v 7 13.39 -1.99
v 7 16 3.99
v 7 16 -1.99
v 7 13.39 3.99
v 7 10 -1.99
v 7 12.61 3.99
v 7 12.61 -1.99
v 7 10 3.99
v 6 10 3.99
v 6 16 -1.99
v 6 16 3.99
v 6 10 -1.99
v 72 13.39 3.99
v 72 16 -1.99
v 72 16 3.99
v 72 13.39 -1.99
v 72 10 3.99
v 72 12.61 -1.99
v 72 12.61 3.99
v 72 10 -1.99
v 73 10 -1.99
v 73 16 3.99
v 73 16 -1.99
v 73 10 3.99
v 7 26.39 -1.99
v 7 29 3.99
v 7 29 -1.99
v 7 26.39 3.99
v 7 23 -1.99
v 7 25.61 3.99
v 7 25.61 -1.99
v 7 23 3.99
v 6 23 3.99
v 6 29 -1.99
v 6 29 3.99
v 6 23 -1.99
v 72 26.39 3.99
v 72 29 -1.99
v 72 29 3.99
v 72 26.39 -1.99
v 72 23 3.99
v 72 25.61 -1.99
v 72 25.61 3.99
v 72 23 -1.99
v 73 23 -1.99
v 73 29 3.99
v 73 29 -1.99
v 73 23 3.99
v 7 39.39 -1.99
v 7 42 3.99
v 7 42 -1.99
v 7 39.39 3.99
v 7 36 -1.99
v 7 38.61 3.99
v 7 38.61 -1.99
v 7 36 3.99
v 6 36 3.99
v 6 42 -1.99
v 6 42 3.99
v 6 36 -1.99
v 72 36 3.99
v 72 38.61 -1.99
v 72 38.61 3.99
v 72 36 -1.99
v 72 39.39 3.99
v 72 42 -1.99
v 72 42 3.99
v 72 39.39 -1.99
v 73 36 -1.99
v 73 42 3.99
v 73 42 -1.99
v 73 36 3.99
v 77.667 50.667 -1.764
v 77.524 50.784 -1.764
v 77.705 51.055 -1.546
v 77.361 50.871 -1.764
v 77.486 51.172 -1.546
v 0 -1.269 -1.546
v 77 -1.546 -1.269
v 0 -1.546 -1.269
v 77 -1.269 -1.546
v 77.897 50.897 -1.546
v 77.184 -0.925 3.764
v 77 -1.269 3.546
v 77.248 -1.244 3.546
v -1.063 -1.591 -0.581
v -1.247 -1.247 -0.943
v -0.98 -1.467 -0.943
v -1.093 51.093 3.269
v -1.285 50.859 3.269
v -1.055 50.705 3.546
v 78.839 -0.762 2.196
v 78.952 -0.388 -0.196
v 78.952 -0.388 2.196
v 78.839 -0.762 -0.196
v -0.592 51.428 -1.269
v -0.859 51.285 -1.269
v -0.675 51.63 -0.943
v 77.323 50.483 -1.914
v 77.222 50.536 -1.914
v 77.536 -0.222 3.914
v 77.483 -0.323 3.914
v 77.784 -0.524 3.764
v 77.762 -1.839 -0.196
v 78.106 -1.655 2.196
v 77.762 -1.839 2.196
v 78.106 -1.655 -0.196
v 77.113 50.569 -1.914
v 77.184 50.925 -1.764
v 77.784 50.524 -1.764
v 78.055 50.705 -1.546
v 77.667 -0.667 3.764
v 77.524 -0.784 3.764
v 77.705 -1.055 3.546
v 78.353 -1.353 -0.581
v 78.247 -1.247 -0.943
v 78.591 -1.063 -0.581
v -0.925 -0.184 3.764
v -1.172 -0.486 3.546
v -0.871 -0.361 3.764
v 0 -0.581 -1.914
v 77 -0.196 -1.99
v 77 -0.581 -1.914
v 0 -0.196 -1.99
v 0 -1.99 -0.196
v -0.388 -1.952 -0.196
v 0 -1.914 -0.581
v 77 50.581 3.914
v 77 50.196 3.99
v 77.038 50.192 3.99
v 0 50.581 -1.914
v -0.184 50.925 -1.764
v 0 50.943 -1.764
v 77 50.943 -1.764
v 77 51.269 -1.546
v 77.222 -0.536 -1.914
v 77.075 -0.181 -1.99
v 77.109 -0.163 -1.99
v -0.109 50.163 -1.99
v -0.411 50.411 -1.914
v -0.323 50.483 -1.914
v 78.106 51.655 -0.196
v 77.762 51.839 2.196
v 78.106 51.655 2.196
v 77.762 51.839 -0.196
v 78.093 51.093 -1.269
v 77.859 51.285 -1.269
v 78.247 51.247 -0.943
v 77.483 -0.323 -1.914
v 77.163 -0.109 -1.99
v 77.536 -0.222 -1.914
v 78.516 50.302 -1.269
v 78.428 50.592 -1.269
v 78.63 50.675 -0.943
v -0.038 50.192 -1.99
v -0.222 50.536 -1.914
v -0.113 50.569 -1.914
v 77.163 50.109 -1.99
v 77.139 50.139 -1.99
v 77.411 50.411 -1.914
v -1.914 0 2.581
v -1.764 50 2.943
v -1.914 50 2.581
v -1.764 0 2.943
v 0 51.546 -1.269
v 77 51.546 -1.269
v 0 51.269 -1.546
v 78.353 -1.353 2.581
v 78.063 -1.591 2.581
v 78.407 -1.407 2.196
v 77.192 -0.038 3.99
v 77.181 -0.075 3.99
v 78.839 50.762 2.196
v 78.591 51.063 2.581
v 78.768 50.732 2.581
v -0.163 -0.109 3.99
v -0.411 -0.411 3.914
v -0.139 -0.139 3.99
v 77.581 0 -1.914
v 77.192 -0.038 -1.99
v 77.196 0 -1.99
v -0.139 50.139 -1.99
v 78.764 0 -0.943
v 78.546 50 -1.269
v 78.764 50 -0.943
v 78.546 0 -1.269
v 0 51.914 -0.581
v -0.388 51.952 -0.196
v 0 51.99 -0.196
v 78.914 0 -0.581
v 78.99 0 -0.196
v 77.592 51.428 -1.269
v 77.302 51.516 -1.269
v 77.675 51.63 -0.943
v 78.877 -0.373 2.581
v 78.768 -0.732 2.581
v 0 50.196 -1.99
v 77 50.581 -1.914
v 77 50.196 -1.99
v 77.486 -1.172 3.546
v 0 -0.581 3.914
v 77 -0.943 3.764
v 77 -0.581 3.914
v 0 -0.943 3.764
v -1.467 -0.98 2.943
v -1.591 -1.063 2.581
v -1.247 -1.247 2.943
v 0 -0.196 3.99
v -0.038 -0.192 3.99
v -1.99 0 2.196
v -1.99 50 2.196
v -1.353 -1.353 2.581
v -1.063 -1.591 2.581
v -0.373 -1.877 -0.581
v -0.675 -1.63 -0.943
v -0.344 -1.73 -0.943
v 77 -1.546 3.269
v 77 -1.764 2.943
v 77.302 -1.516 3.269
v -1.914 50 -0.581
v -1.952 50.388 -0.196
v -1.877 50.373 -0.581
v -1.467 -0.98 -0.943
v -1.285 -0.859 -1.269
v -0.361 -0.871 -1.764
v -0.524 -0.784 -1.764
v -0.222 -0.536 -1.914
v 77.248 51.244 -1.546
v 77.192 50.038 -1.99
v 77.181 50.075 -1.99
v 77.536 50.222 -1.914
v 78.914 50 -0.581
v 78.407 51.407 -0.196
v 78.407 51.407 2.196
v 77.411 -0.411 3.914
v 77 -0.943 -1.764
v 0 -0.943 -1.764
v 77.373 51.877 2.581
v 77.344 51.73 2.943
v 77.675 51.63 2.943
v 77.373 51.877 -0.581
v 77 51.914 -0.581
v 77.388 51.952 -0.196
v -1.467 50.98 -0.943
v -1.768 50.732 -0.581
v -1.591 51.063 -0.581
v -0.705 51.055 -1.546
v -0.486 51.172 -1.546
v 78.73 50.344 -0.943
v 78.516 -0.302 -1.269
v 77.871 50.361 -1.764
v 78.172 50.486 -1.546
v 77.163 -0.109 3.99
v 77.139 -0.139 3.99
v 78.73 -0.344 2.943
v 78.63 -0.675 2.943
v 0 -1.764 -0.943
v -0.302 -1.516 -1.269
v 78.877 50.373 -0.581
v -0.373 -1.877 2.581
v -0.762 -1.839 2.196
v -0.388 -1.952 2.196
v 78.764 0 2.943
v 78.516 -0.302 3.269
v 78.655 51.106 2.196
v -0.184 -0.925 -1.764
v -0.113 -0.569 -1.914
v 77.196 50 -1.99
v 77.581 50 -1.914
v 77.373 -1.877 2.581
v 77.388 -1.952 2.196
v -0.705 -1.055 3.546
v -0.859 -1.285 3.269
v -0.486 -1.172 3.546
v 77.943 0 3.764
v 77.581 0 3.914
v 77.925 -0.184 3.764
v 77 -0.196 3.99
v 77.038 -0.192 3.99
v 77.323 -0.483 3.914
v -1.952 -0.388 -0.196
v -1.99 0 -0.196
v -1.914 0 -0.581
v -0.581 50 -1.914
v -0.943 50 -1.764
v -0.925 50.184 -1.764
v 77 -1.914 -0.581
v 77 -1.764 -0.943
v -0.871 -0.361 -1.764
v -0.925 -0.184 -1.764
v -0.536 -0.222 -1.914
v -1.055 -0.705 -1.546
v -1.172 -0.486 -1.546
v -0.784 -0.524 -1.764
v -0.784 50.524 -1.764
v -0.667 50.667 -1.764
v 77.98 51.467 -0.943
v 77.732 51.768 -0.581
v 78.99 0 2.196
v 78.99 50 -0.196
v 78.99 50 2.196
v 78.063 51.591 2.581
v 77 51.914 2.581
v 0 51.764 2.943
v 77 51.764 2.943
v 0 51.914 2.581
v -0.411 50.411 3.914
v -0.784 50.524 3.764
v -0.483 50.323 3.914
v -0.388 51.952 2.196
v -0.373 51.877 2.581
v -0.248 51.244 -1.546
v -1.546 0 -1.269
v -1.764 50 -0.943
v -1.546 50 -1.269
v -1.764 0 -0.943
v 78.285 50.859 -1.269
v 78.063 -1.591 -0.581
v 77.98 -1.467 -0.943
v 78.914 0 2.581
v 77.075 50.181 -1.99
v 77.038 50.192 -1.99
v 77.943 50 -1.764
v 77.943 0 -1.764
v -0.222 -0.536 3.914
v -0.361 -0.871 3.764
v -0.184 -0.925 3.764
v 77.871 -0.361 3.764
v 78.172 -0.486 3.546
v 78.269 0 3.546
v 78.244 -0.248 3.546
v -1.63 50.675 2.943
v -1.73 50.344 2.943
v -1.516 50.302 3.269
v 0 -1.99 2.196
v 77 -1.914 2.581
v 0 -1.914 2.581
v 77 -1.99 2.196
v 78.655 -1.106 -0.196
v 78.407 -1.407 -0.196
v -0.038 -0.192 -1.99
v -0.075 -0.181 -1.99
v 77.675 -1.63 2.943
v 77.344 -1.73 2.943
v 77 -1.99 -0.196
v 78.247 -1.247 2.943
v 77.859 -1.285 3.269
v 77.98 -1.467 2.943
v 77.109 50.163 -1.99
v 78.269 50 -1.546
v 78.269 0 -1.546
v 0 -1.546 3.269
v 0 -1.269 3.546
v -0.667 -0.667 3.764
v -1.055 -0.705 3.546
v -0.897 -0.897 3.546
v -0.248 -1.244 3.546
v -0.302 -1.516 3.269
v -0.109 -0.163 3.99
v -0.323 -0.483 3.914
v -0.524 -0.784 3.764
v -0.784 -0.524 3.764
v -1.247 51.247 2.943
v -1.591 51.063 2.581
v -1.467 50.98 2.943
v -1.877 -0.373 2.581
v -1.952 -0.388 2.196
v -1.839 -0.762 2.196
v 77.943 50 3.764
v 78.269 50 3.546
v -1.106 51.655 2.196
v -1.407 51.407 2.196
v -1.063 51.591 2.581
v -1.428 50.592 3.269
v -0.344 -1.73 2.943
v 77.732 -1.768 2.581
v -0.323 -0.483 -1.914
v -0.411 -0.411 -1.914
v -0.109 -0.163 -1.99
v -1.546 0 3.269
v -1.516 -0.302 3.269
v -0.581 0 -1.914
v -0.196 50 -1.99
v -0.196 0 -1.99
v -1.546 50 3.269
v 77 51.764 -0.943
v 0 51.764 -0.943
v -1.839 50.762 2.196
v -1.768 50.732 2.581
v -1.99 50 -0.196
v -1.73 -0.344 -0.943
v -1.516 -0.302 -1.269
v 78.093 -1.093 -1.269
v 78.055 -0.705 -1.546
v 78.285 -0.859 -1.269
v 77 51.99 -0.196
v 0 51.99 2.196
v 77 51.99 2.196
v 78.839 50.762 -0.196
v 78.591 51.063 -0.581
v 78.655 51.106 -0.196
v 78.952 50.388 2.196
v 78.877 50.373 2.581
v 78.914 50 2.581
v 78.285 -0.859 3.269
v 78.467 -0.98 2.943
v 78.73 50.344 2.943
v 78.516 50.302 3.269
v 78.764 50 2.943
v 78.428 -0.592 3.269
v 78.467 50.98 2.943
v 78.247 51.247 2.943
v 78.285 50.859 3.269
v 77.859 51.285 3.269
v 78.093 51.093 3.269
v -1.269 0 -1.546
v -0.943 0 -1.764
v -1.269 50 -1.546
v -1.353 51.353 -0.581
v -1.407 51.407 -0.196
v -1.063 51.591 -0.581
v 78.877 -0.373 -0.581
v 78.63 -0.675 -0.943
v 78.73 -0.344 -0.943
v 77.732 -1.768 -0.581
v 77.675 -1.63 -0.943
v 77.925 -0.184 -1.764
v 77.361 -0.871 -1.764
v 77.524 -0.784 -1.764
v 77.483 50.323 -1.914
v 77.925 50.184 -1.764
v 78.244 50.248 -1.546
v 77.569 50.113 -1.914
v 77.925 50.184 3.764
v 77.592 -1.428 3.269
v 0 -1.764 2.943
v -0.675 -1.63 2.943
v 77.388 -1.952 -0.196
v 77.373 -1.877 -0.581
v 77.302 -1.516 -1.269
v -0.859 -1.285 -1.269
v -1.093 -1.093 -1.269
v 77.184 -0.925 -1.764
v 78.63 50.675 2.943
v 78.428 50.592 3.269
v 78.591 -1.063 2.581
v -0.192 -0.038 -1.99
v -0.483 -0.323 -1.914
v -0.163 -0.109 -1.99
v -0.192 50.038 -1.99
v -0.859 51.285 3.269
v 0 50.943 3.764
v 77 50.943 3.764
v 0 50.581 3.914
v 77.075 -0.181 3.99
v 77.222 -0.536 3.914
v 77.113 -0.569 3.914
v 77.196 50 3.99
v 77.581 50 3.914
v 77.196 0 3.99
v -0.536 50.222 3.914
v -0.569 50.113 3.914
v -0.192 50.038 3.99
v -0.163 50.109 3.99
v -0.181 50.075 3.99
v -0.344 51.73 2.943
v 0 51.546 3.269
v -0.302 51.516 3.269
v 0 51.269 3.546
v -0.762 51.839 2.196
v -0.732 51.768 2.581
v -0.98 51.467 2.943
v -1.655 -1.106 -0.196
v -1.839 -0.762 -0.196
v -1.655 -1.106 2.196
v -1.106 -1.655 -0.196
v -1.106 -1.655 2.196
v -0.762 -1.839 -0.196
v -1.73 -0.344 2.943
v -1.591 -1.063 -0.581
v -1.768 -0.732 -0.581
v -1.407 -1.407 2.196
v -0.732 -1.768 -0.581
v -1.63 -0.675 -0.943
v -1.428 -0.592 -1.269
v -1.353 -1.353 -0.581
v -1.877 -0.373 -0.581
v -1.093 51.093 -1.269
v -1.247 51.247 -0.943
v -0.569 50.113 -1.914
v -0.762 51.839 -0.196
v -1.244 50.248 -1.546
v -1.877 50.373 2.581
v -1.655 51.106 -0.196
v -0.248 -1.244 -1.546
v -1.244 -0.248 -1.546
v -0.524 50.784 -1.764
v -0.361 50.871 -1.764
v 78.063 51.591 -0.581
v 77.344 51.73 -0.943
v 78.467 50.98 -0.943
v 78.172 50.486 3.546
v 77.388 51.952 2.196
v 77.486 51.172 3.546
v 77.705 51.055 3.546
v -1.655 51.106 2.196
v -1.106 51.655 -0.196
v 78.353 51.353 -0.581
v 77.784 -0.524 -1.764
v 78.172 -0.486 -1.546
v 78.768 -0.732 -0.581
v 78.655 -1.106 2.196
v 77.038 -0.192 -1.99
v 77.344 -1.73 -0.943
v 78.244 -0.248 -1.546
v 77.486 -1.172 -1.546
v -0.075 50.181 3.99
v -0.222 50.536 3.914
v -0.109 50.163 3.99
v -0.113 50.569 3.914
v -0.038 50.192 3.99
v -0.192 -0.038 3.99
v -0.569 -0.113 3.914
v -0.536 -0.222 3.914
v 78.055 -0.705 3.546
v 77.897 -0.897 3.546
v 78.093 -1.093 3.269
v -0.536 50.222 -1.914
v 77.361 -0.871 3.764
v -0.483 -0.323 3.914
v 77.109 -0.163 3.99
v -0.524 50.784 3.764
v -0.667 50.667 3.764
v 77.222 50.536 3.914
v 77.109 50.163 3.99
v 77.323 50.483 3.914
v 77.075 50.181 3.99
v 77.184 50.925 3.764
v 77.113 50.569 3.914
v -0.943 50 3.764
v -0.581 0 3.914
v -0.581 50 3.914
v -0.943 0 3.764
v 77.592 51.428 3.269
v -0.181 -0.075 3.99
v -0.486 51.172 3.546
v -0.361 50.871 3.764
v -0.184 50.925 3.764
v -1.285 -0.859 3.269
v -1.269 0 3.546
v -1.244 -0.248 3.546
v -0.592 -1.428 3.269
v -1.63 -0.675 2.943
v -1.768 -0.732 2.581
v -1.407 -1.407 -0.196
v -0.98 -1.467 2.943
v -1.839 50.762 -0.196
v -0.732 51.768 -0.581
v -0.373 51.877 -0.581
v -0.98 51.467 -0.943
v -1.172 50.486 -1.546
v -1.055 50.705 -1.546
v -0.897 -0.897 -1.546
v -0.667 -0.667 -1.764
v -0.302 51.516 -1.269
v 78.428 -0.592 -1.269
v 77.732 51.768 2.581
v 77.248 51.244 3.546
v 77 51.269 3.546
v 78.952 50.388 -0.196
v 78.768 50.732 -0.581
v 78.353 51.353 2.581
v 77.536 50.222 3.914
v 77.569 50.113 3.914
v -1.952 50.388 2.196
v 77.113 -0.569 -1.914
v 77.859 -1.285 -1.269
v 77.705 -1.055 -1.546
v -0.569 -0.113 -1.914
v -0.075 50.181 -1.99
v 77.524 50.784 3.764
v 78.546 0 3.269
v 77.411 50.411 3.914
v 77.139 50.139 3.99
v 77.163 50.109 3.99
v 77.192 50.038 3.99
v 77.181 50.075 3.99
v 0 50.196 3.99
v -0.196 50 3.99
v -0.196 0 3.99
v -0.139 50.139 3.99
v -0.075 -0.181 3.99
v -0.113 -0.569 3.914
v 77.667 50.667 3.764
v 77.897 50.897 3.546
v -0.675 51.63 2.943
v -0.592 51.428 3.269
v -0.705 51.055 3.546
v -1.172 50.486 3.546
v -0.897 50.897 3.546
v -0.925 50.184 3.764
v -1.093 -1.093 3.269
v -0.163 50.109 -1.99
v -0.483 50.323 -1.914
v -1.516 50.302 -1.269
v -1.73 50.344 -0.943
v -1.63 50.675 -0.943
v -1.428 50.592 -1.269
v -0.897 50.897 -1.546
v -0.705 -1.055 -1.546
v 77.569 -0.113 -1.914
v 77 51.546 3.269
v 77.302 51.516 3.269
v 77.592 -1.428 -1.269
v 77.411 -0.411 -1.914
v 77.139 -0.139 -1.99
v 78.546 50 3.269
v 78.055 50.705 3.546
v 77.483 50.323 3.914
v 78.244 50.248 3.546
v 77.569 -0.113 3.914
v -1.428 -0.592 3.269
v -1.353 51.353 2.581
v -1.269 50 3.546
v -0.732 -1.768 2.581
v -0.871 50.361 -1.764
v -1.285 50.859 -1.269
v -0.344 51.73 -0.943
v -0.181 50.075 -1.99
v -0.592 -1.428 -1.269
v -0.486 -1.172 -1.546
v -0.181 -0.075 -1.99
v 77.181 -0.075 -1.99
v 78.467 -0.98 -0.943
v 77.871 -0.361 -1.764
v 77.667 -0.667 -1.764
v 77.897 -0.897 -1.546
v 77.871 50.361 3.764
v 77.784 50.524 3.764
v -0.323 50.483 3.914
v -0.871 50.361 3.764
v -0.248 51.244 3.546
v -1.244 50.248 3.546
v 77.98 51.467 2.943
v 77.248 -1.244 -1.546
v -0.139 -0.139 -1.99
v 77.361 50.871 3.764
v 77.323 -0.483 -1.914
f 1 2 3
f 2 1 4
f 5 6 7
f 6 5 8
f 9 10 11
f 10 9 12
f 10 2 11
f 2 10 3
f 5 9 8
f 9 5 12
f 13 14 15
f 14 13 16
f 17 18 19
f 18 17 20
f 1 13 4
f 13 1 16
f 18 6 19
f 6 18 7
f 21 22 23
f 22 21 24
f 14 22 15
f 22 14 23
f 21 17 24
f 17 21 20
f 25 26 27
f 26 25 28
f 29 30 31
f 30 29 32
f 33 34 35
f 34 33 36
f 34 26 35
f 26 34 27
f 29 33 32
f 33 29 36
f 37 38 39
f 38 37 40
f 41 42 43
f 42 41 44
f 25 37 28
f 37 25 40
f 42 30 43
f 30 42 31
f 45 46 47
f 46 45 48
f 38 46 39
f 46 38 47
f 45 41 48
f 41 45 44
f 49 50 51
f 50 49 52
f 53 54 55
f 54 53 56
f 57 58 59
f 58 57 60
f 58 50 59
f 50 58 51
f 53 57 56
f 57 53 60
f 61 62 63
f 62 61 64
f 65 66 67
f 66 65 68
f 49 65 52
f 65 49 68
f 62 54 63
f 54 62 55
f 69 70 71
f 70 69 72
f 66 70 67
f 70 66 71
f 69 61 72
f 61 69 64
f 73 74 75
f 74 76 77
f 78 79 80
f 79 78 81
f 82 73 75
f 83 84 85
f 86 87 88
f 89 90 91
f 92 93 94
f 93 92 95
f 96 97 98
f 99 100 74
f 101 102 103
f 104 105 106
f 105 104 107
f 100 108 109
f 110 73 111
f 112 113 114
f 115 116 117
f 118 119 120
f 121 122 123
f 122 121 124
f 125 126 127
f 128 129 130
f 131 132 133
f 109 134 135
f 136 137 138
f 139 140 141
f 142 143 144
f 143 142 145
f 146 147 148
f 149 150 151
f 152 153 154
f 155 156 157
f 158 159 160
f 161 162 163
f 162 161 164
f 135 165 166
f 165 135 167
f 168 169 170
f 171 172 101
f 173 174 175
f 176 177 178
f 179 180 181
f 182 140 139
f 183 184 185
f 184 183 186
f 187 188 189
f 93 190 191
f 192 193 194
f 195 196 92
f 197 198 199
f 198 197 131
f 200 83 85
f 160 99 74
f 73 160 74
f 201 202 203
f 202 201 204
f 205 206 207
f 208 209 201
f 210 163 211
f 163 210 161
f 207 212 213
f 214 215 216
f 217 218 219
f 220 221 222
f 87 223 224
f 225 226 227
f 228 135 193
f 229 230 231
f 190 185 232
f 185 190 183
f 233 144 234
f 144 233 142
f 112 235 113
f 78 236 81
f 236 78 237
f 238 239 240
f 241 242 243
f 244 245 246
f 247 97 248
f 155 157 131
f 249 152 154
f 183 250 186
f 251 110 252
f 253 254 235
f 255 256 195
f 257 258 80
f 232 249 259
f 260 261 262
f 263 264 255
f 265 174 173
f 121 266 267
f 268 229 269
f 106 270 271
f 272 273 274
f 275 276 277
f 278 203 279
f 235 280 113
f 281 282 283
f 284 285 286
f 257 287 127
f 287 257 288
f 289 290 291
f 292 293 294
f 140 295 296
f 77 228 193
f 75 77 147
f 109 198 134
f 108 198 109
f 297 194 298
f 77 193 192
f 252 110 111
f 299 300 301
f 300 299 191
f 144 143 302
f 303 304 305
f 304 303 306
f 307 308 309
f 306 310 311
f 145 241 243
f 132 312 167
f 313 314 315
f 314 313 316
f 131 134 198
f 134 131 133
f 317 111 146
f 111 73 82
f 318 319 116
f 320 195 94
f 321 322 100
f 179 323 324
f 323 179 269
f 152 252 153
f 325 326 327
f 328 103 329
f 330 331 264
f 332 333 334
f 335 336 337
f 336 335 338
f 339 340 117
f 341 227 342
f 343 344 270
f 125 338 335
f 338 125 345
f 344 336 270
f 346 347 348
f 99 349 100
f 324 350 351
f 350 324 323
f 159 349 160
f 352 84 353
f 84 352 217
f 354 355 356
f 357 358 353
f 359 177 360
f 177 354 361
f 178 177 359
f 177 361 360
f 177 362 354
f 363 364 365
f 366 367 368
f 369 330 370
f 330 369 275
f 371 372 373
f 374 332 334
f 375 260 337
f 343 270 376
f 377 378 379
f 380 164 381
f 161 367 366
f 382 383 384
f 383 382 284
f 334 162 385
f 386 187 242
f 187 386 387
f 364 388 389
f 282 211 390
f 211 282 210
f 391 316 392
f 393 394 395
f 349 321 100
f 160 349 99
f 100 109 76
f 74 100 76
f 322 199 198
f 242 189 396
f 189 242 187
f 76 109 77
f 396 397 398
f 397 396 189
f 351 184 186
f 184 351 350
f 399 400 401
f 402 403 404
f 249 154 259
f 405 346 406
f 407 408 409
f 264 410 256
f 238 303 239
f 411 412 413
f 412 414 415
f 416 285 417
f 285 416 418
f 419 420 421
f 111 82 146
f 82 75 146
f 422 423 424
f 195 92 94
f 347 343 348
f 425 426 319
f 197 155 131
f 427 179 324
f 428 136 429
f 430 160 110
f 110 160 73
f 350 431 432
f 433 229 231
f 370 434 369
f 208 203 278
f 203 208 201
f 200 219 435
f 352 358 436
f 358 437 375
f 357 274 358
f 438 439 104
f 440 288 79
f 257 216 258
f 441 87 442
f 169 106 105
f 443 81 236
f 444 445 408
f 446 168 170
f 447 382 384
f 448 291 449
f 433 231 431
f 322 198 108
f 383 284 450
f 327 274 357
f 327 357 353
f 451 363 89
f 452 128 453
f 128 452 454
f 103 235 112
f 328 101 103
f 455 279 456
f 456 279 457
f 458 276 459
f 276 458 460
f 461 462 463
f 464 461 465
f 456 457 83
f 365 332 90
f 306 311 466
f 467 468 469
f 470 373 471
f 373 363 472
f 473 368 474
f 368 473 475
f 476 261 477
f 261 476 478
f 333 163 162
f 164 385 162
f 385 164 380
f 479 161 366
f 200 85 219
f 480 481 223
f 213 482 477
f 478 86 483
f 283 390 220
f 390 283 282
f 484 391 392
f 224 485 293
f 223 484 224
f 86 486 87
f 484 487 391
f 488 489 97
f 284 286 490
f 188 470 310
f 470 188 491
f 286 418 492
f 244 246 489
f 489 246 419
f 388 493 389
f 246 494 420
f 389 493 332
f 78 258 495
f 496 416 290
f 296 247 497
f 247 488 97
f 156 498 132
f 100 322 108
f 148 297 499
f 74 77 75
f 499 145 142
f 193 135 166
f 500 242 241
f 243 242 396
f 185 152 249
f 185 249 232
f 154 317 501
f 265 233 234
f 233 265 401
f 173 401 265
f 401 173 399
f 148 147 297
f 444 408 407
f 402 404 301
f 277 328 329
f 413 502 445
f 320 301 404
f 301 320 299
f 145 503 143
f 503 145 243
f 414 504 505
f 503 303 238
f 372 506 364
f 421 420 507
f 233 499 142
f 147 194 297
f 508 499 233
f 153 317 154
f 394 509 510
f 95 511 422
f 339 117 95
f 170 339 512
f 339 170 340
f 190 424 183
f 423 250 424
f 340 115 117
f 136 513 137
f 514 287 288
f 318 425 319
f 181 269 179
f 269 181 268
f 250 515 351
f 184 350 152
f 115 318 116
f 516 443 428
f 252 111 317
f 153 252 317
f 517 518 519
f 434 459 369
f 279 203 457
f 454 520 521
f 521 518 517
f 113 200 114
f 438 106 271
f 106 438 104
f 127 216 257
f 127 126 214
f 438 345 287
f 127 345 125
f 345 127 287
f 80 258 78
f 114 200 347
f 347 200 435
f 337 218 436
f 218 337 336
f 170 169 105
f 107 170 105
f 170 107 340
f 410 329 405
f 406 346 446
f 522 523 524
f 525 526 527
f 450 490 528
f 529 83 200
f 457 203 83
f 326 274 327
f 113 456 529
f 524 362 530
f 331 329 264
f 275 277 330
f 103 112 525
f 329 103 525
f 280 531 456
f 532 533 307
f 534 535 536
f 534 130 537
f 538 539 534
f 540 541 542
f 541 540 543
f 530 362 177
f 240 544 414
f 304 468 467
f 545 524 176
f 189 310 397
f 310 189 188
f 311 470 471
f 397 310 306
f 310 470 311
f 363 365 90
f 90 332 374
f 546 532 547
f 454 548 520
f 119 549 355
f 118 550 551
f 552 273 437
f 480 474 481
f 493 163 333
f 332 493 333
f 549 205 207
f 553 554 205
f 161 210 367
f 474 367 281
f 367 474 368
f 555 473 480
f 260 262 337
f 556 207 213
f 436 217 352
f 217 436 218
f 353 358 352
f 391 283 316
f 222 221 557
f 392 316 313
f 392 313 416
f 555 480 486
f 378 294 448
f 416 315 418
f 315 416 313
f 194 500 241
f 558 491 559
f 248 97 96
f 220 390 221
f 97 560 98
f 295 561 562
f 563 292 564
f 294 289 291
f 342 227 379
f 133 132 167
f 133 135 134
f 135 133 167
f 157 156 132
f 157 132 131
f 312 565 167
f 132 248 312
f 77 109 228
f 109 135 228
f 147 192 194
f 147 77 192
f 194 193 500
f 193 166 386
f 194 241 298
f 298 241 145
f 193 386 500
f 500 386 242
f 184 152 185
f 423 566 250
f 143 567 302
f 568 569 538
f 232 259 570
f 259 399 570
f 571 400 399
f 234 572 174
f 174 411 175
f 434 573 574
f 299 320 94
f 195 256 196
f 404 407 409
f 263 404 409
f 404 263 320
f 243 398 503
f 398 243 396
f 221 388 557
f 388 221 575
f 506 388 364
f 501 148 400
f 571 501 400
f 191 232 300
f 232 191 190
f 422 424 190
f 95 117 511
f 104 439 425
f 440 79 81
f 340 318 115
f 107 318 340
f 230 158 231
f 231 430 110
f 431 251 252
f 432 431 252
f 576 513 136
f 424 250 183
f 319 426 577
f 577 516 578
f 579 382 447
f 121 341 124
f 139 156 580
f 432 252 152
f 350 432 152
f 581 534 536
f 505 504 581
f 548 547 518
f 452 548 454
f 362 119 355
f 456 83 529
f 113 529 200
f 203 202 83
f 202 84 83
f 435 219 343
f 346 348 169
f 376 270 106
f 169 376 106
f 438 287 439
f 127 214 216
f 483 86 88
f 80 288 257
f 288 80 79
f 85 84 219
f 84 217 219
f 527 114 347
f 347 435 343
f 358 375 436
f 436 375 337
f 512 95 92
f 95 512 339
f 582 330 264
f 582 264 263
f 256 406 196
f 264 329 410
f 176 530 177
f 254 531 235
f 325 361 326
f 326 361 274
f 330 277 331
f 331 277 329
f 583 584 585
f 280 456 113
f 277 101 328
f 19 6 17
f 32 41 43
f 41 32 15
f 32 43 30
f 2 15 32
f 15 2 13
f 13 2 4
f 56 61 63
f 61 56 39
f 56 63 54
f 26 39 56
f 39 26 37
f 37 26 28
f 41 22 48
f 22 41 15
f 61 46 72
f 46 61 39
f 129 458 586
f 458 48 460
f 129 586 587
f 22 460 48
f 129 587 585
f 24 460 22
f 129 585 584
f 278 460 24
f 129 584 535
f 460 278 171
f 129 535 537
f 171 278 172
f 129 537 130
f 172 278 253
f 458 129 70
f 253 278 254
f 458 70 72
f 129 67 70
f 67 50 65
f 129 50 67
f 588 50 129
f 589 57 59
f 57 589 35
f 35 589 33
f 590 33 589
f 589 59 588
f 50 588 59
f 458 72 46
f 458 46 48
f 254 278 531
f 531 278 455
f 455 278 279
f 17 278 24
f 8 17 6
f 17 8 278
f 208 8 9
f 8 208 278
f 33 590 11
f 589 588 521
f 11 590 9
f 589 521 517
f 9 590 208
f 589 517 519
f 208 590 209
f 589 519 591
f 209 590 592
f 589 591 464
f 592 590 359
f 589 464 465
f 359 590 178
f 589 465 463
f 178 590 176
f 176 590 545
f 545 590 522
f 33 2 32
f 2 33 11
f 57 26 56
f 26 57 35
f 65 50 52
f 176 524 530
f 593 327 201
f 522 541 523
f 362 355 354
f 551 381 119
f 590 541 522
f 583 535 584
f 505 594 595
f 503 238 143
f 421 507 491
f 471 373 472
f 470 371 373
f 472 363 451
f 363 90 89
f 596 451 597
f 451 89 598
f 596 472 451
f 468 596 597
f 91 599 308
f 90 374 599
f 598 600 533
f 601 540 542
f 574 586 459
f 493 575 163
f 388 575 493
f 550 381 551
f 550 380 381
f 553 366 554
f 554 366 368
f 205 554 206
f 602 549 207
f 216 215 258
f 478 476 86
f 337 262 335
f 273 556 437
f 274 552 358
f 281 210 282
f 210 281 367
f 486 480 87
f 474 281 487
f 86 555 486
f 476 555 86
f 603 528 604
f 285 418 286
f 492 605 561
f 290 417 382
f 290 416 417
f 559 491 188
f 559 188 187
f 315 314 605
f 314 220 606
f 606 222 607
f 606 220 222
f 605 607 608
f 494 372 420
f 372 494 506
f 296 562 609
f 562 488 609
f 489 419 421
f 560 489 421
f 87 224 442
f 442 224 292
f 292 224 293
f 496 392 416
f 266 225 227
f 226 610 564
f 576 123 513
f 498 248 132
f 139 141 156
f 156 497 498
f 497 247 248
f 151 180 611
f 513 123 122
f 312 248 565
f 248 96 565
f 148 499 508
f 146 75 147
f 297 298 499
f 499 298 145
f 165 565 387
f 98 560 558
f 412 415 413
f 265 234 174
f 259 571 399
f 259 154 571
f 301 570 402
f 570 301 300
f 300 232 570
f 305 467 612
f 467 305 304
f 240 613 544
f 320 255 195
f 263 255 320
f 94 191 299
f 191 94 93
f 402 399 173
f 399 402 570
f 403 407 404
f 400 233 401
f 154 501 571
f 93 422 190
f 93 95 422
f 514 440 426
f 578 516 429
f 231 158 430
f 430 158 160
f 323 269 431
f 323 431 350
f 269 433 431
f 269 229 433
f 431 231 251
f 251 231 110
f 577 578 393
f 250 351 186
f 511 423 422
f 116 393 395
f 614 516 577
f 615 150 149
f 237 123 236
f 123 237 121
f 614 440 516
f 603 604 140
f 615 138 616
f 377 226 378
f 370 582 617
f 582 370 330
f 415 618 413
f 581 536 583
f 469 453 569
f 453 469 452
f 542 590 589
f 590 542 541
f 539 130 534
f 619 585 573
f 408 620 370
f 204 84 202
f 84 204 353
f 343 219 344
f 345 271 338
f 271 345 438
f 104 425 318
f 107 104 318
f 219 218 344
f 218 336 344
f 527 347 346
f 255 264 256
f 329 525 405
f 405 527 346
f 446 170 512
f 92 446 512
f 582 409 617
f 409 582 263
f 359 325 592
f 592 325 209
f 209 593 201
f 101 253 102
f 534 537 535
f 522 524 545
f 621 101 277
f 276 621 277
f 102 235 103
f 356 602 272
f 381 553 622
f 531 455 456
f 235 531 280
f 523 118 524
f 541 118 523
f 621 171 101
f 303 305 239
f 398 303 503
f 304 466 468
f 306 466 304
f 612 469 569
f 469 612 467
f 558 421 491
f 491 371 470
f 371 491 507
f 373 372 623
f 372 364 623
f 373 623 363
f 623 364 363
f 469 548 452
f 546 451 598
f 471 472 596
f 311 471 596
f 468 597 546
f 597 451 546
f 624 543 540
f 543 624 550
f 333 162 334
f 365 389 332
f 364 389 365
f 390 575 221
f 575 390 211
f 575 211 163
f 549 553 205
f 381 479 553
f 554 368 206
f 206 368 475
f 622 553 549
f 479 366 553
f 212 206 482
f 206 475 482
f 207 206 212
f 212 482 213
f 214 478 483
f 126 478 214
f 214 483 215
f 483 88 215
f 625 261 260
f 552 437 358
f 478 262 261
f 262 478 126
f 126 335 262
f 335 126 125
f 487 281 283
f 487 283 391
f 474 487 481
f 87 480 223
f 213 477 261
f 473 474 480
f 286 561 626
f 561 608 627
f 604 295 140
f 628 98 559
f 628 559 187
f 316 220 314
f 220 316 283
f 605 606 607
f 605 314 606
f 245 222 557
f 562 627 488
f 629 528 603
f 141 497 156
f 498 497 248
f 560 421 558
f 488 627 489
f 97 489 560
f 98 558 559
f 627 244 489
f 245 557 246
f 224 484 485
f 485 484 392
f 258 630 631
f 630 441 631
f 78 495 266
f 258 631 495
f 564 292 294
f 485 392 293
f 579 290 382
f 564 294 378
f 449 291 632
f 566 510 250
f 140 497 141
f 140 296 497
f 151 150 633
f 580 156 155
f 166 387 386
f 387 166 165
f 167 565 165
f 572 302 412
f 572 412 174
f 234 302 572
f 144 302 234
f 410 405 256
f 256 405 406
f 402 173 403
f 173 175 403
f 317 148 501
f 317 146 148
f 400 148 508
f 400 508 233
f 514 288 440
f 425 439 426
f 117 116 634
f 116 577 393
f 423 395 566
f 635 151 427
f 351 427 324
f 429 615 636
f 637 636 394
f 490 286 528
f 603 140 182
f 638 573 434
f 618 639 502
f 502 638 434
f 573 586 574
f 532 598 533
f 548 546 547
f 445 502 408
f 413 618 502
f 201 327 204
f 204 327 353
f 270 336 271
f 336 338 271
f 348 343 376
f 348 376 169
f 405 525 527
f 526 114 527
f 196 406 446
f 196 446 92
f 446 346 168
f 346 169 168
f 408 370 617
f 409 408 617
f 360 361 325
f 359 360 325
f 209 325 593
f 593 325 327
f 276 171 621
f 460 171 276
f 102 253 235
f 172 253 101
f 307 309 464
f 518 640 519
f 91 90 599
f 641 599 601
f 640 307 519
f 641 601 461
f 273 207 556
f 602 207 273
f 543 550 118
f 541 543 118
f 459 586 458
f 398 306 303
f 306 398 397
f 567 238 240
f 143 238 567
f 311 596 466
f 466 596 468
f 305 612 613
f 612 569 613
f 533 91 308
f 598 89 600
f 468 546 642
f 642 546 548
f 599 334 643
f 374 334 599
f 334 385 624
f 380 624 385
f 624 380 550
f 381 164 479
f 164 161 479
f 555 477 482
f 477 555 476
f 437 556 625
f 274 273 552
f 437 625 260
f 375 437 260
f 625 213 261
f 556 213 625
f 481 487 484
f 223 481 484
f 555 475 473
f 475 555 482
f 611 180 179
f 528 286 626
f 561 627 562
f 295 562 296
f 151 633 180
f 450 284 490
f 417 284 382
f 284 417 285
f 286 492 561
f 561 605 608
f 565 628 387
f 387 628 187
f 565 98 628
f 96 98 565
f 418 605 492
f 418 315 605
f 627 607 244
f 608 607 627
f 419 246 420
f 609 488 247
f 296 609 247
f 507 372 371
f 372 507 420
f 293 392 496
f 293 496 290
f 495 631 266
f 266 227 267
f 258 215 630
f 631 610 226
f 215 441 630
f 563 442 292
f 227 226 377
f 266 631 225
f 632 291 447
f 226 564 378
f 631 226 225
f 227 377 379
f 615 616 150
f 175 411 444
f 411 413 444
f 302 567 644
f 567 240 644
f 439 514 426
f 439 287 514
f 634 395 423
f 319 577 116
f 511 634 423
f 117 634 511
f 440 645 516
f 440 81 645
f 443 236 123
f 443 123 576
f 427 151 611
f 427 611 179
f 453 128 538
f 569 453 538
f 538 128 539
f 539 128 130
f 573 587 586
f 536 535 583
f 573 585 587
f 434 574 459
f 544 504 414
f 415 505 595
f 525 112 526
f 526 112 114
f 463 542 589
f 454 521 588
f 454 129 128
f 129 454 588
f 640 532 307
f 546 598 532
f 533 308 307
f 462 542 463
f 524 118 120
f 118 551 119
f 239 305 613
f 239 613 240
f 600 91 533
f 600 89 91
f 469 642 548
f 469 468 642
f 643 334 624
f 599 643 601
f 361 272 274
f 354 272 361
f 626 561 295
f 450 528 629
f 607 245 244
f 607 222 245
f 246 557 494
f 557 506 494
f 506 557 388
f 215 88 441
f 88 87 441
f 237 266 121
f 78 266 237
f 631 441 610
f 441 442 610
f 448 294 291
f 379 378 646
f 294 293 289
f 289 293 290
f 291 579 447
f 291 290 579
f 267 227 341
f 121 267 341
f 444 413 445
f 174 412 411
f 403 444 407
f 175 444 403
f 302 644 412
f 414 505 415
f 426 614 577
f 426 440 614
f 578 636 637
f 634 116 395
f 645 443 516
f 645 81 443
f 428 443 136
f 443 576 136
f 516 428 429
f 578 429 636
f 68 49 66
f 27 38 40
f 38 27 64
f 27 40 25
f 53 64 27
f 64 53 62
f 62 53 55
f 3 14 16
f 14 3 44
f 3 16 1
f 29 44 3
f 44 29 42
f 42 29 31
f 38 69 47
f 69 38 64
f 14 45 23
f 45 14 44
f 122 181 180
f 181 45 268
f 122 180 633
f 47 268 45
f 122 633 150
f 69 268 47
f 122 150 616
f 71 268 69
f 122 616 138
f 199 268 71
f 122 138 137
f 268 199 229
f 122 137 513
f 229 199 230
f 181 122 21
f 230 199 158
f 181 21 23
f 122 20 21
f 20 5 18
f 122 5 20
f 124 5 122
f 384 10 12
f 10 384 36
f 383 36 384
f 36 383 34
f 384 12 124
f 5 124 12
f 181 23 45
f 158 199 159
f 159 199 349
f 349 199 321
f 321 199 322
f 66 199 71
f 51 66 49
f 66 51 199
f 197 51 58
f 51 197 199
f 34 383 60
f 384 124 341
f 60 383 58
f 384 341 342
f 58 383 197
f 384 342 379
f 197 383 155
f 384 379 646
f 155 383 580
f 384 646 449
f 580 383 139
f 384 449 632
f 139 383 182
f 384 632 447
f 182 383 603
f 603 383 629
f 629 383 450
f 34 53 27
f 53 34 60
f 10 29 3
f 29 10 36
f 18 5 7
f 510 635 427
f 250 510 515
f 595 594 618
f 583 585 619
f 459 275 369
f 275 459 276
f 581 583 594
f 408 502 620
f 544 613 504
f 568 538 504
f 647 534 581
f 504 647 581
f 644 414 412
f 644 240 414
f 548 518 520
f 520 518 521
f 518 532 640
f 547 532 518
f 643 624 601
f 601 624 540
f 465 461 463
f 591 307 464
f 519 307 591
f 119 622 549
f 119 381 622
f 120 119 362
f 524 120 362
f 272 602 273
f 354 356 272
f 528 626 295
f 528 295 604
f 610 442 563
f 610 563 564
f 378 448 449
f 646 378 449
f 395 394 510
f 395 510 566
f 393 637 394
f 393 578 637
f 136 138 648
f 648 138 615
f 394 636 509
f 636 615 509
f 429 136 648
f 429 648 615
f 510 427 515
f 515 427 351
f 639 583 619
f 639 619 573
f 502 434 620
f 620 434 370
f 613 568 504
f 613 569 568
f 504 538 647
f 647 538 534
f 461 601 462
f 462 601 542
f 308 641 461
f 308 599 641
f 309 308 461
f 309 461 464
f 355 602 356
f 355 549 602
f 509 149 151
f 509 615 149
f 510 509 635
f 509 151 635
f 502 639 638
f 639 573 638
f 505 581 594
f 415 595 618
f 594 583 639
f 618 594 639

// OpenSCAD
/*

Creator
*****************

Constantin Ganshin

Project name:
*****************
Toothpaste_Squeezer_3_Rails

Description:

    Toothpaste squeezer with 3 open spaces for folding the toothpaste tube into 3
                                  
             -----------------------------
            |                             |
            |  ************************   |
            |                             |
            |  ************************   |
            |                             |
            |  ************************   |
            |                             |
             -----------------------------                   
*/

// Resolution variables
$fa = 1;
$fs = 0.4;

// Toothpaste Squeezer Configuration
cube_width_x = 77;
cube_height_y = 50;
cube_depth_z = 2;

slot_width_x = 65;  
slot_hight_y = 0.78;
slot_padding_sides_x = (cube_width_x - slot_width_x) / 2;
slot_padding_top_buttom_y = 10;

side_slot_width_x = 1;
side_slot_hight_y = 6;

slot_spacing_y = (cube_height_y - (2 * slot_padding_top_buttom_y)) / 3 + 3;  // spacing between openings
echo(str("slot_spacing_y = ", slot_spacing_y));

module toothpaste_squeezer() {
    difference() {
        minkowski(){
            cube([cube_width_x, cube_height_y, cube_depth_z]); // Base cube
            sphere(2);
        }
        for (i = [0:2]){
            translate([slot_padding_sides_x, slot_padding_top_buttom_y + (slot_spacing_y * i), -2])
                cube([side_slot_width_x, side_slot_hight_y, cube_depth_z + 4]); // Side slot left
            translate([slot_padding_sides_x + side_slot_width_x, slot_padding_top_buttom_y + (side_slot_hight_y / 2) - (slot_hight_y/2) + (slot_spacing_y * i), -2])
                cube([slot_width_x, slot_hight_y, cube_depth_z + 4]); // Main slot
            translate([slot_padding_sides_x + side_slot_width_x + slot_width_x, slot_padding_top_buttom_y + (slot_spacing_y * i), -2])
                cube([side_slot_width_x, side_slot_hight_y, cube_depth_z + 4]); // Side slot right    
        }
    }
}

toothpaste_squeezer();
